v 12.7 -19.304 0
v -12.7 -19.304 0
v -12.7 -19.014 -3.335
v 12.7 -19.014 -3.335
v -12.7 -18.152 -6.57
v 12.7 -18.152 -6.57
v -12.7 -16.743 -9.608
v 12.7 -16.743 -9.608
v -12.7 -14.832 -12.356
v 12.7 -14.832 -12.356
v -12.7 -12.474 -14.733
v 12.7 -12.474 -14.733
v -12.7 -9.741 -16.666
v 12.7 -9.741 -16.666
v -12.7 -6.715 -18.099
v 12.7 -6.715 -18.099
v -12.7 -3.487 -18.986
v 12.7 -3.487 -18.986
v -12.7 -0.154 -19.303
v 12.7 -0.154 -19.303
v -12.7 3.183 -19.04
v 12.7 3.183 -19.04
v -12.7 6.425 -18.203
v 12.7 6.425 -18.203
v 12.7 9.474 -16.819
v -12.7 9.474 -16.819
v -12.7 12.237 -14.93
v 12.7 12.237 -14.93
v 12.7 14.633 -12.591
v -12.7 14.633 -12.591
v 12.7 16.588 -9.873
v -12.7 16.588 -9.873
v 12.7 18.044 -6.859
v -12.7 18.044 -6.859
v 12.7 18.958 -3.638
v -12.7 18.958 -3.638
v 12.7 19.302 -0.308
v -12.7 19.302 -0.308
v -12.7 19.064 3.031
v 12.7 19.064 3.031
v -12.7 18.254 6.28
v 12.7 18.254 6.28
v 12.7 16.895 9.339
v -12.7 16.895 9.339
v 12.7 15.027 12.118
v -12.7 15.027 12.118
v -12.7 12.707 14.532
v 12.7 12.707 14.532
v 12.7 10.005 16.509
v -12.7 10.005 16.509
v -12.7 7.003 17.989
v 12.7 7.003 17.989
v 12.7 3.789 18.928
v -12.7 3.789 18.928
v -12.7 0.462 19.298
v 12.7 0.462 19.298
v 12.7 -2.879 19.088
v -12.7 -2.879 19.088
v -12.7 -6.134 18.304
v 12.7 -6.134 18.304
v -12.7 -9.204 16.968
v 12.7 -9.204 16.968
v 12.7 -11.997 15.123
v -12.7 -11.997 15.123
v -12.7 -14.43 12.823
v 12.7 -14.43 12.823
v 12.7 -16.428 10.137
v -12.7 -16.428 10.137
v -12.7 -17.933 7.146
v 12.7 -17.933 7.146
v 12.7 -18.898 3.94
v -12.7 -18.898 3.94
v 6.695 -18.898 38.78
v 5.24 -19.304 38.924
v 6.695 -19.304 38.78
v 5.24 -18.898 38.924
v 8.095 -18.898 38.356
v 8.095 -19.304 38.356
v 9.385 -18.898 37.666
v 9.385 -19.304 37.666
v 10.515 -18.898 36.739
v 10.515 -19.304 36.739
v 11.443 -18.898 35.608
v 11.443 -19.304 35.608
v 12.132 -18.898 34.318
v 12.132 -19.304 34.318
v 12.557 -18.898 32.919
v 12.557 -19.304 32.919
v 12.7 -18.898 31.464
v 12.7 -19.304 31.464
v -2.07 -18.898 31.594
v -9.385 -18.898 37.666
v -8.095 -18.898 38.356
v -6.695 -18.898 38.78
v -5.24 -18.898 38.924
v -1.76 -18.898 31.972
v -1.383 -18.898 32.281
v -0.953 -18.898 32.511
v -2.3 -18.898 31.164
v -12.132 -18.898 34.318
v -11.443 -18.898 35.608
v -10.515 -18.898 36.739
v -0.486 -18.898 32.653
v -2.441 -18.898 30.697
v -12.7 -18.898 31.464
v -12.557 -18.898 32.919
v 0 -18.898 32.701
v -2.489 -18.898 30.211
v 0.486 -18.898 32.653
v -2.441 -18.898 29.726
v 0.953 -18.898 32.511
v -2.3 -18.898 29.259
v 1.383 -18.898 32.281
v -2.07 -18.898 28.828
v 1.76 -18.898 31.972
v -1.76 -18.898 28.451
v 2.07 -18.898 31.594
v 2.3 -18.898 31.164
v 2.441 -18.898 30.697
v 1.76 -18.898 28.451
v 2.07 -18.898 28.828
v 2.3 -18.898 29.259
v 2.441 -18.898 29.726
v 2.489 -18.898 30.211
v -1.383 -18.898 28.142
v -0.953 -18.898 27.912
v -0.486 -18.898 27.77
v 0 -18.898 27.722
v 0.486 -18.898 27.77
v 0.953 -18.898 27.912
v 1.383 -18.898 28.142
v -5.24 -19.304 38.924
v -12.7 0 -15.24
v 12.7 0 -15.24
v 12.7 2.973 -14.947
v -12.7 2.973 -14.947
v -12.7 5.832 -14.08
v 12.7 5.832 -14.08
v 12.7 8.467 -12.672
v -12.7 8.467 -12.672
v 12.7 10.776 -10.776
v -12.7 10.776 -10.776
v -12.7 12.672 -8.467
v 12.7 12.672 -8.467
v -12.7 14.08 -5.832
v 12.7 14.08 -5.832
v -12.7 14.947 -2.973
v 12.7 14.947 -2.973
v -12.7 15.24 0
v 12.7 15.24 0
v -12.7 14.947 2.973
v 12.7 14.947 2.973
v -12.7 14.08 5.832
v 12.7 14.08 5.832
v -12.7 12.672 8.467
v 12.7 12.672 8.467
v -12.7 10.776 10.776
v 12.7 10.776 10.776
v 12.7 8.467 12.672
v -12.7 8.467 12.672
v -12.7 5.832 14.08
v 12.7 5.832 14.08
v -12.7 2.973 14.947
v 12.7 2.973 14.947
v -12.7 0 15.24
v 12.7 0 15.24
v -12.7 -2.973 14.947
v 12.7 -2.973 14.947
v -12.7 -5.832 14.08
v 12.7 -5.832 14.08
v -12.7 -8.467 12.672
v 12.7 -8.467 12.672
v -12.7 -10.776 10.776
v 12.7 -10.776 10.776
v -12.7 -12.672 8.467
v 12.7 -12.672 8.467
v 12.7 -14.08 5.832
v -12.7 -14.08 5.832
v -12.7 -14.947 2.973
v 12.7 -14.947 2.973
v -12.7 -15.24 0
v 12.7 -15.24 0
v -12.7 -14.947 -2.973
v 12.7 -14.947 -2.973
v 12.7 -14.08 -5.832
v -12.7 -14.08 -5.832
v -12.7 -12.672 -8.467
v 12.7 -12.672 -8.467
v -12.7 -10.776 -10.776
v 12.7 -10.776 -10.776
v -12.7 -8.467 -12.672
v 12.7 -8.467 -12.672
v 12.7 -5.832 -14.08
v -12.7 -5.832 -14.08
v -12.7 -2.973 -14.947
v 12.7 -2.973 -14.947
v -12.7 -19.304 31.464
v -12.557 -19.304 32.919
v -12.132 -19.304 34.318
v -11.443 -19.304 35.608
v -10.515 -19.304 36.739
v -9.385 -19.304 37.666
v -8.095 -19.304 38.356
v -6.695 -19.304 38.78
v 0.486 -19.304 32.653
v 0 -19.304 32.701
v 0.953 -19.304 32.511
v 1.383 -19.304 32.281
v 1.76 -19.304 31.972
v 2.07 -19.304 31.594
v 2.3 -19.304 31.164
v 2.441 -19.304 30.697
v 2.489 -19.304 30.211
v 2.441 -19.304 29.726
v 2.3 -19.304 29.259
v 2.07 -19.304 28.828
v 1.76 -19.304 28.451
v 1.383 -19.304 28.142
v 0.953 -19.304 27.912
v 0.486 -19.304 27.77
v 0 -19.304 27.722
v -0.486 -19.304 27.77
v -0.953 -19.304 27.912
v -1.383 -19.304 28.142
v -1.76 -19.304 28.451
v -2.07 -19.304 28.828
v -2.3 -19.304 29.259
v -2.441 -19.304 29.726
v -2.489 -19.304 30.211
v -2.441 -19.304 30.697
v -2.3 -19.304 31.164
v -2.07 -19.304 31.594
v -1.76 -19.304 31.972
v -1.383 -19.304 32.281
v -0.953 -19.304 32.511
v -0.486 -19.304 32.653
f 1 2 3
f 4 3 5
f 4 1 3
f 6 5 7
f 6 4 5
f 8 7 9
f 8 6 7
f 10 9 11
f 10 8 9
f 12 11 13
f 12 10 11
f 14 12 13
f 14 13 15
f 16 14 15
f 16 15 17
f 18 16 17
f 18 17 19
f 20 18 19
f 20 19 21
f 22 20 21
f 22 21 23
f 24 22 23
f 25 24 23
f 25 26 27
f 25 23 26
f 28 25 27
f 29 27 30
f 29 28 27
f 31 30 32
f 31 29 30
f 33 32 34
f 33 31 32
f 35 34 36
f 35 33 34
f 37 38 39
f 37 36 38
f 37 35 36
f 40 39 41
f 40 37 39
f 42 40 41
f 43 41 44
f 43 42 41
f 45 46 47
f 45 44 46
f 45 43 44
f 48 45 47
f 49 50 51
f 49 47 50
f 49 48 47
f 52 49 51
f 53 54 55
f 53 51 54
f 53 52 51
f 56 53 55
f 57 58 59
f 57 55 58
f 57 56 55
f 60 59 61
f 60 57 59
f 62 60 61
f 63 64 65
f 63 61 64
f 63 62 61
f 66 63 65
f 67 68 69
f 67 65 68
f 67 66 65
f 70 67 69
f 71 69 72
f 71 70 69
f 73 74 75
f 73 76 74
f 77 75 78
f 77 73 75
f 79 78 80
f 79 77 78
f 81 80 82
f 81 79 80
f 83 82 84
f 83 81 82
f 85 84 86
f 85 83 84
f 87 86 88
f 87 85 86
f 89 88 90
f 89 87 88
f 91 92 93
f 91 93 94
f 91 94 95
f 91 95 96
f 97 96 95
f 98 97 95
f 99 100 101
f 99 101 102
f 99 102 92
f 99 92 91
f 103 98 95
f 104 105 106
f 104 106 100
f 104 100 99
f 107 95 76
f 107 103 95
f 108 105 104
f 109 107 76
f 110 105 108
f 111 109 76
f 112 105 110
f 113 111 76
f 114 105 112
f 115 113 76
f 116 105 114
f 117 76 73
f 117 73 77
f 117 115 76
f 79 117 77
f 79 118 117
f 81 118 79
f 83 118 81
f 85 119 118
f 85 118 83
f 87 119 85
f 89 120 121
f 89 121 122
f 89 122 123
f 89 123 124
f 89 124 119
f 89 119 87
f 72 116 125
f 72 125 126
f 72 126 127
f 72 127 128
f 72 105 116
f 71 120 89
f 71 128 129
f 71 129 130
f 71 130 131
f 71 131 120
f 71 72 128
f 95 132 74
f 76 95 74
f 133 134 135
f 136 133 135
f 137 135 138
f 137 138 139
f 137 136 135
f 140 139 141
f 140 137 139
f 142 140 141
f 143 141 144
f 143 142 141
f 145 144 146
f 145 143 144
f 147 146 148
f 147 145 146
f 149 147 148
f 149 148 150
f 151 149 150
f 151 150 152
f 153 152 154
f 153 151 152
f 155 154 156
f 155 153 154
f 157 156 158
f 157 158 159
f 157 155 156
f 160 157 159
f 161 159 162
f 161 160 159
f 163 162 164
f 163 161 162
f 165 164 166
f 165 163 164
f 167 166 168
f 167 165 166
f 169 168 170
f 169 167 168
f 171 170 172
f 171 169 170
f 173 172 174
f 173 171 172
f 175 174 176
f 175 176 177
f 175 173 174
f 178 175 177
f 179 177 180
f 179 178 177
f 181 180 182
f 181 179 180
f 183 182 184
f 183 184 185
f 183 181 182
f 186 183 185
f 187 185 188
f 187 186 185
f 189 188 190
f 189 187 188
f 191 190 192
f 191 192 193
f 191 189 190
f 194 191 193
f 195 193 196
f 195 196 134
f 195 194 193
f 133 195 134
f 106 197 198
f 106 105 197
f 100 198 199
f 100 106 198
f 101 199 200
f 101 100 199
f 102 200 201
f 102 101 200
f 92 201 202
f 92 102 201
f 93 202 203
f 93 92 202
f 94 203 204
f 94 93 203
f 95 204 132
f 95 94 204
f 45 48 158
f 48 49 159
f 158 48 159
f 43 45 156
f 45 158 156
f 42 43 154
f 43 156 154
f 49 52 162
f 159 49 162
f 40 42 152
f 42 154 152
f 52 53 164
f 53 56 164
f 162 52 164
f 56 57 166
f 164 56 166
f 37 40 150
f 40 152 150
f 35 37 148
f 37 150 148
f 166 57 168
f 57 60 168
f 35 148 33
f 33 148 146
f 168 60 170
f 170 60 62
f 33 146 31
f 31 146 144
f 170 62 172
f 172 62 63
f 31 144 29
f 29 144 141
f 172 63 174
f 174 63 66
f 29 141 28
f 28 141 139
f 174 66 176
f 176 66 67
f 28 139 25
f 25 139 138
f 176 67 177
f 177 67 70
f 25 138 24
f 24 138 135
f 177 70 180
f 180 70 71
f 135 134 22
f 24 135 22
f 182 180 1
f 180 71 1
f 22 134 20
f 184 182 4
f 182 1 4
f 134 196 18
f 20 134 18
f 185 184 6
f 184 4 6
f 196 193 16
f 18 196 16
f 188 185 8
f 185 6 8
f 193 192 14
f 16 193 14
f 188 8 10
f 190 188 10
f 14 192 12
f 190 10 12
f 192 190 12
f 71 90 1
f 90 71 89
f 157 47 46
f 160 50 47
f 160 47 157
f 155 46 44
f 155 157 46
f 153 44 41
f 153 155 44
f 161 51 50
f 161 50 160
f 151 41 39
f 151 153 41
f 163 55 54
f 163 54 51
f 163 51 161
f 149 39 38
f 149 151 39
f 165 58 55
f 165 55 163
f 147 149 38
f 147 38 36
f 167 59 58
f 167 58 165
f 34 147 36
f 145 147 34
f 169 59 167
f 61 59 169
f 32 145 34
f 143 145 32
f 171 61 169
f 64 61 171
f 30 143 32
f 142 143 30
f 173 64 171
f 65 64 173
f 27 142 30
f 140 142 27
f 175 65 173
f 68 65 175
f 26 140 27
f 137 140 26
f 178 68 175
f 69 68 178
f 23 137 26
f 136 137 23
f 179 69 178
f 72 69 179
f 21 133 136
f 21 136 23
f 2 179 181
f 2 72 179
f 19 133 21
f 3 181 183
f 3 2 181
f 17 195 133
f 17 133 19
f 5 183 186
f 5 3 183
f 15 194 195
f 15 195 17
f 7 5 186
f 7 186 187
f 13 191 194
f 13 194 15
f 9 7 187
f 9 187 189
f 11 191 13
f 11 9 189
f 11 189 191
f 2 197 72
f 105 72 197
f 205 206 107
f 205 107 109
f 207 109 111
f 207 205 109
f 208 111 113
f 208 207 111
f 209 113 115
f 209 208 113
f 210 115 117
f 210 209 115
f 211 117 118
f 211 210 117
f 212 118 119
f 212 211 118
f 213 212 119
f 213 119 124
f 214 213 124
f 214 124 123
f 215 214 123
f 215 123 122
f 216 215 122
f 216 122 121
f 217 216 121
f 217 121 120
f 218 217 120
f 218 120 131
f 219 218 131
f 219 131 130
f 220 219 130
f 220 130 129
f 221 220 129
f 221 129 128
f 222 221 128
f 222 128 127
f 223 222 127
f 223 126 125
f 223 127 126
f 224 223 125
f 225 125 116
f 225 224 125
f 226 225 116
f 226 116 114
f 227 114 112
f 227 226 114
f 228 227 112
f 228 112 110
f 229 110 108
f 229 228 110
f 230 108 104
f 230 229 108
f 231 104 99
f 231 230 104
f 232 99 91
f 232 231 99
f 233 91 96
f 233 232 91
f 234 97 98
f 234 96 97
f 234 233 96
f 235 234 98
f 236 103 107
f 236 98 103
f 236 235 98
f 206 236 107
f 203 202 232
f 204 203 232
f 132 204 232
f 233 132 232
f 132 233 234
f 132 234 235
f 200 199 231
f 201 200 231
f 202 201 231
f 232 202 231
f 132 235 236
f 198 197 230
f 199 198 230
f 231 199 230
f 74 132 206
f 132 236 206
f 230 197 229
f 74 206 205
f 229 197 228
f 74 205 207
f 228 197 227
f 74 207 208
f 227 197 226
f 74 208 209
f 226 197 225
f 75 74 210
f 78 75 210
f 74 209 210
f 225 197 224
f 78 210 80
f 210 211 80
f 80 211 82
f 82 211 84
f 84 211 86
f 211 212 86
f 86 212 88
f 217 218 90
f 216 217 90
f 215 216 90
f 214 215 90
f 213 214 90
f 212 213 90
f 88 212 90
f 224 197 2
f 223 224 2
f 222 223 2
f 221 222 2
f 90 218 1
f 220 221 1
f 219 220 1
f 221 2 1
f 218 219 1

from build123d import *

# Parameters (mm, degrees)
SKETCH1_R               = 19.304
SKETCH1_R_2             = 15.24
BOSS_EXTRUDE1_DEPTH     = 12.7
SKETCH2_W               = 25.4
SKETCH2_H               = 38.923585408
BOSS_EXTRUDE2_DEPTH     = 0.4064
CUT_EXTRUDE1_DEPTH      = 56.997301217
CUT_EXTRUDE1_DEPTH_BACK = 56.997301217
SKETCH3_R               = 2.4892
FILLET1_R               = 7.46


with BuildPart() as part:
    # Sketch1 → Boss-Extrude1 (new, symmetric)
    with BuildSketch(Plane(origin=(0, 0, 0), x_dir=(0, 0, -1), z_dir=(1, 0, 0))):
        Circle(SKETCH1_R)
        Circle(SKETCH1_R_2, mode=Mode.SUBTRACT)
    extrude(amount=BOSS_EXTRUDE1_DEPTH, both=True)

    # Sketch2 → Boss-Extrude2 (add)
    with BuildSketch(Plane(origin=(0, -19.304, 0), x_dir=(1, 0, 0), z_dir=(0, 1, 0))):
        with Locations((0, -19.461792704)):
            Rectangle(SKETCH2_W, SKETCH2_H)
    extrude(amount=BOSS_EXTRUDE2_DEPTH)

    # Sketch3 → Cut-Extrude1 (cut, two sides: drawn at the far end of the back side and taken through both)
    with BuildSketch(Plane(origin=(0, -18.8976, 0), x_dir=(1, 0, 0), z_dir=(0, 1, 0)).offset(-CUT_EXTRUDE1_DEPTH_BACK)):
        with Locations(Location((0, -30.211385408, 0), (0, 0, 270))):
            Circle(SKETCH3_R)
    extrude(amount=CUT_EXTRUDE1_DEPTH + CUT_EXTRUDE1_DEPTH_BACK, mode=Mode.SUBTRACT)

    # Fillet1
    fillet1_edges = [part.edges().sort_by_distance(p)[0] for p in [
        (12.7, -19.1008, 38.923585408),
        (-12.7, -19.1008, 38.923585408),
    ]]
    fillet(fillet1_edges, radius=FILLET1_R)


solid = part.part
